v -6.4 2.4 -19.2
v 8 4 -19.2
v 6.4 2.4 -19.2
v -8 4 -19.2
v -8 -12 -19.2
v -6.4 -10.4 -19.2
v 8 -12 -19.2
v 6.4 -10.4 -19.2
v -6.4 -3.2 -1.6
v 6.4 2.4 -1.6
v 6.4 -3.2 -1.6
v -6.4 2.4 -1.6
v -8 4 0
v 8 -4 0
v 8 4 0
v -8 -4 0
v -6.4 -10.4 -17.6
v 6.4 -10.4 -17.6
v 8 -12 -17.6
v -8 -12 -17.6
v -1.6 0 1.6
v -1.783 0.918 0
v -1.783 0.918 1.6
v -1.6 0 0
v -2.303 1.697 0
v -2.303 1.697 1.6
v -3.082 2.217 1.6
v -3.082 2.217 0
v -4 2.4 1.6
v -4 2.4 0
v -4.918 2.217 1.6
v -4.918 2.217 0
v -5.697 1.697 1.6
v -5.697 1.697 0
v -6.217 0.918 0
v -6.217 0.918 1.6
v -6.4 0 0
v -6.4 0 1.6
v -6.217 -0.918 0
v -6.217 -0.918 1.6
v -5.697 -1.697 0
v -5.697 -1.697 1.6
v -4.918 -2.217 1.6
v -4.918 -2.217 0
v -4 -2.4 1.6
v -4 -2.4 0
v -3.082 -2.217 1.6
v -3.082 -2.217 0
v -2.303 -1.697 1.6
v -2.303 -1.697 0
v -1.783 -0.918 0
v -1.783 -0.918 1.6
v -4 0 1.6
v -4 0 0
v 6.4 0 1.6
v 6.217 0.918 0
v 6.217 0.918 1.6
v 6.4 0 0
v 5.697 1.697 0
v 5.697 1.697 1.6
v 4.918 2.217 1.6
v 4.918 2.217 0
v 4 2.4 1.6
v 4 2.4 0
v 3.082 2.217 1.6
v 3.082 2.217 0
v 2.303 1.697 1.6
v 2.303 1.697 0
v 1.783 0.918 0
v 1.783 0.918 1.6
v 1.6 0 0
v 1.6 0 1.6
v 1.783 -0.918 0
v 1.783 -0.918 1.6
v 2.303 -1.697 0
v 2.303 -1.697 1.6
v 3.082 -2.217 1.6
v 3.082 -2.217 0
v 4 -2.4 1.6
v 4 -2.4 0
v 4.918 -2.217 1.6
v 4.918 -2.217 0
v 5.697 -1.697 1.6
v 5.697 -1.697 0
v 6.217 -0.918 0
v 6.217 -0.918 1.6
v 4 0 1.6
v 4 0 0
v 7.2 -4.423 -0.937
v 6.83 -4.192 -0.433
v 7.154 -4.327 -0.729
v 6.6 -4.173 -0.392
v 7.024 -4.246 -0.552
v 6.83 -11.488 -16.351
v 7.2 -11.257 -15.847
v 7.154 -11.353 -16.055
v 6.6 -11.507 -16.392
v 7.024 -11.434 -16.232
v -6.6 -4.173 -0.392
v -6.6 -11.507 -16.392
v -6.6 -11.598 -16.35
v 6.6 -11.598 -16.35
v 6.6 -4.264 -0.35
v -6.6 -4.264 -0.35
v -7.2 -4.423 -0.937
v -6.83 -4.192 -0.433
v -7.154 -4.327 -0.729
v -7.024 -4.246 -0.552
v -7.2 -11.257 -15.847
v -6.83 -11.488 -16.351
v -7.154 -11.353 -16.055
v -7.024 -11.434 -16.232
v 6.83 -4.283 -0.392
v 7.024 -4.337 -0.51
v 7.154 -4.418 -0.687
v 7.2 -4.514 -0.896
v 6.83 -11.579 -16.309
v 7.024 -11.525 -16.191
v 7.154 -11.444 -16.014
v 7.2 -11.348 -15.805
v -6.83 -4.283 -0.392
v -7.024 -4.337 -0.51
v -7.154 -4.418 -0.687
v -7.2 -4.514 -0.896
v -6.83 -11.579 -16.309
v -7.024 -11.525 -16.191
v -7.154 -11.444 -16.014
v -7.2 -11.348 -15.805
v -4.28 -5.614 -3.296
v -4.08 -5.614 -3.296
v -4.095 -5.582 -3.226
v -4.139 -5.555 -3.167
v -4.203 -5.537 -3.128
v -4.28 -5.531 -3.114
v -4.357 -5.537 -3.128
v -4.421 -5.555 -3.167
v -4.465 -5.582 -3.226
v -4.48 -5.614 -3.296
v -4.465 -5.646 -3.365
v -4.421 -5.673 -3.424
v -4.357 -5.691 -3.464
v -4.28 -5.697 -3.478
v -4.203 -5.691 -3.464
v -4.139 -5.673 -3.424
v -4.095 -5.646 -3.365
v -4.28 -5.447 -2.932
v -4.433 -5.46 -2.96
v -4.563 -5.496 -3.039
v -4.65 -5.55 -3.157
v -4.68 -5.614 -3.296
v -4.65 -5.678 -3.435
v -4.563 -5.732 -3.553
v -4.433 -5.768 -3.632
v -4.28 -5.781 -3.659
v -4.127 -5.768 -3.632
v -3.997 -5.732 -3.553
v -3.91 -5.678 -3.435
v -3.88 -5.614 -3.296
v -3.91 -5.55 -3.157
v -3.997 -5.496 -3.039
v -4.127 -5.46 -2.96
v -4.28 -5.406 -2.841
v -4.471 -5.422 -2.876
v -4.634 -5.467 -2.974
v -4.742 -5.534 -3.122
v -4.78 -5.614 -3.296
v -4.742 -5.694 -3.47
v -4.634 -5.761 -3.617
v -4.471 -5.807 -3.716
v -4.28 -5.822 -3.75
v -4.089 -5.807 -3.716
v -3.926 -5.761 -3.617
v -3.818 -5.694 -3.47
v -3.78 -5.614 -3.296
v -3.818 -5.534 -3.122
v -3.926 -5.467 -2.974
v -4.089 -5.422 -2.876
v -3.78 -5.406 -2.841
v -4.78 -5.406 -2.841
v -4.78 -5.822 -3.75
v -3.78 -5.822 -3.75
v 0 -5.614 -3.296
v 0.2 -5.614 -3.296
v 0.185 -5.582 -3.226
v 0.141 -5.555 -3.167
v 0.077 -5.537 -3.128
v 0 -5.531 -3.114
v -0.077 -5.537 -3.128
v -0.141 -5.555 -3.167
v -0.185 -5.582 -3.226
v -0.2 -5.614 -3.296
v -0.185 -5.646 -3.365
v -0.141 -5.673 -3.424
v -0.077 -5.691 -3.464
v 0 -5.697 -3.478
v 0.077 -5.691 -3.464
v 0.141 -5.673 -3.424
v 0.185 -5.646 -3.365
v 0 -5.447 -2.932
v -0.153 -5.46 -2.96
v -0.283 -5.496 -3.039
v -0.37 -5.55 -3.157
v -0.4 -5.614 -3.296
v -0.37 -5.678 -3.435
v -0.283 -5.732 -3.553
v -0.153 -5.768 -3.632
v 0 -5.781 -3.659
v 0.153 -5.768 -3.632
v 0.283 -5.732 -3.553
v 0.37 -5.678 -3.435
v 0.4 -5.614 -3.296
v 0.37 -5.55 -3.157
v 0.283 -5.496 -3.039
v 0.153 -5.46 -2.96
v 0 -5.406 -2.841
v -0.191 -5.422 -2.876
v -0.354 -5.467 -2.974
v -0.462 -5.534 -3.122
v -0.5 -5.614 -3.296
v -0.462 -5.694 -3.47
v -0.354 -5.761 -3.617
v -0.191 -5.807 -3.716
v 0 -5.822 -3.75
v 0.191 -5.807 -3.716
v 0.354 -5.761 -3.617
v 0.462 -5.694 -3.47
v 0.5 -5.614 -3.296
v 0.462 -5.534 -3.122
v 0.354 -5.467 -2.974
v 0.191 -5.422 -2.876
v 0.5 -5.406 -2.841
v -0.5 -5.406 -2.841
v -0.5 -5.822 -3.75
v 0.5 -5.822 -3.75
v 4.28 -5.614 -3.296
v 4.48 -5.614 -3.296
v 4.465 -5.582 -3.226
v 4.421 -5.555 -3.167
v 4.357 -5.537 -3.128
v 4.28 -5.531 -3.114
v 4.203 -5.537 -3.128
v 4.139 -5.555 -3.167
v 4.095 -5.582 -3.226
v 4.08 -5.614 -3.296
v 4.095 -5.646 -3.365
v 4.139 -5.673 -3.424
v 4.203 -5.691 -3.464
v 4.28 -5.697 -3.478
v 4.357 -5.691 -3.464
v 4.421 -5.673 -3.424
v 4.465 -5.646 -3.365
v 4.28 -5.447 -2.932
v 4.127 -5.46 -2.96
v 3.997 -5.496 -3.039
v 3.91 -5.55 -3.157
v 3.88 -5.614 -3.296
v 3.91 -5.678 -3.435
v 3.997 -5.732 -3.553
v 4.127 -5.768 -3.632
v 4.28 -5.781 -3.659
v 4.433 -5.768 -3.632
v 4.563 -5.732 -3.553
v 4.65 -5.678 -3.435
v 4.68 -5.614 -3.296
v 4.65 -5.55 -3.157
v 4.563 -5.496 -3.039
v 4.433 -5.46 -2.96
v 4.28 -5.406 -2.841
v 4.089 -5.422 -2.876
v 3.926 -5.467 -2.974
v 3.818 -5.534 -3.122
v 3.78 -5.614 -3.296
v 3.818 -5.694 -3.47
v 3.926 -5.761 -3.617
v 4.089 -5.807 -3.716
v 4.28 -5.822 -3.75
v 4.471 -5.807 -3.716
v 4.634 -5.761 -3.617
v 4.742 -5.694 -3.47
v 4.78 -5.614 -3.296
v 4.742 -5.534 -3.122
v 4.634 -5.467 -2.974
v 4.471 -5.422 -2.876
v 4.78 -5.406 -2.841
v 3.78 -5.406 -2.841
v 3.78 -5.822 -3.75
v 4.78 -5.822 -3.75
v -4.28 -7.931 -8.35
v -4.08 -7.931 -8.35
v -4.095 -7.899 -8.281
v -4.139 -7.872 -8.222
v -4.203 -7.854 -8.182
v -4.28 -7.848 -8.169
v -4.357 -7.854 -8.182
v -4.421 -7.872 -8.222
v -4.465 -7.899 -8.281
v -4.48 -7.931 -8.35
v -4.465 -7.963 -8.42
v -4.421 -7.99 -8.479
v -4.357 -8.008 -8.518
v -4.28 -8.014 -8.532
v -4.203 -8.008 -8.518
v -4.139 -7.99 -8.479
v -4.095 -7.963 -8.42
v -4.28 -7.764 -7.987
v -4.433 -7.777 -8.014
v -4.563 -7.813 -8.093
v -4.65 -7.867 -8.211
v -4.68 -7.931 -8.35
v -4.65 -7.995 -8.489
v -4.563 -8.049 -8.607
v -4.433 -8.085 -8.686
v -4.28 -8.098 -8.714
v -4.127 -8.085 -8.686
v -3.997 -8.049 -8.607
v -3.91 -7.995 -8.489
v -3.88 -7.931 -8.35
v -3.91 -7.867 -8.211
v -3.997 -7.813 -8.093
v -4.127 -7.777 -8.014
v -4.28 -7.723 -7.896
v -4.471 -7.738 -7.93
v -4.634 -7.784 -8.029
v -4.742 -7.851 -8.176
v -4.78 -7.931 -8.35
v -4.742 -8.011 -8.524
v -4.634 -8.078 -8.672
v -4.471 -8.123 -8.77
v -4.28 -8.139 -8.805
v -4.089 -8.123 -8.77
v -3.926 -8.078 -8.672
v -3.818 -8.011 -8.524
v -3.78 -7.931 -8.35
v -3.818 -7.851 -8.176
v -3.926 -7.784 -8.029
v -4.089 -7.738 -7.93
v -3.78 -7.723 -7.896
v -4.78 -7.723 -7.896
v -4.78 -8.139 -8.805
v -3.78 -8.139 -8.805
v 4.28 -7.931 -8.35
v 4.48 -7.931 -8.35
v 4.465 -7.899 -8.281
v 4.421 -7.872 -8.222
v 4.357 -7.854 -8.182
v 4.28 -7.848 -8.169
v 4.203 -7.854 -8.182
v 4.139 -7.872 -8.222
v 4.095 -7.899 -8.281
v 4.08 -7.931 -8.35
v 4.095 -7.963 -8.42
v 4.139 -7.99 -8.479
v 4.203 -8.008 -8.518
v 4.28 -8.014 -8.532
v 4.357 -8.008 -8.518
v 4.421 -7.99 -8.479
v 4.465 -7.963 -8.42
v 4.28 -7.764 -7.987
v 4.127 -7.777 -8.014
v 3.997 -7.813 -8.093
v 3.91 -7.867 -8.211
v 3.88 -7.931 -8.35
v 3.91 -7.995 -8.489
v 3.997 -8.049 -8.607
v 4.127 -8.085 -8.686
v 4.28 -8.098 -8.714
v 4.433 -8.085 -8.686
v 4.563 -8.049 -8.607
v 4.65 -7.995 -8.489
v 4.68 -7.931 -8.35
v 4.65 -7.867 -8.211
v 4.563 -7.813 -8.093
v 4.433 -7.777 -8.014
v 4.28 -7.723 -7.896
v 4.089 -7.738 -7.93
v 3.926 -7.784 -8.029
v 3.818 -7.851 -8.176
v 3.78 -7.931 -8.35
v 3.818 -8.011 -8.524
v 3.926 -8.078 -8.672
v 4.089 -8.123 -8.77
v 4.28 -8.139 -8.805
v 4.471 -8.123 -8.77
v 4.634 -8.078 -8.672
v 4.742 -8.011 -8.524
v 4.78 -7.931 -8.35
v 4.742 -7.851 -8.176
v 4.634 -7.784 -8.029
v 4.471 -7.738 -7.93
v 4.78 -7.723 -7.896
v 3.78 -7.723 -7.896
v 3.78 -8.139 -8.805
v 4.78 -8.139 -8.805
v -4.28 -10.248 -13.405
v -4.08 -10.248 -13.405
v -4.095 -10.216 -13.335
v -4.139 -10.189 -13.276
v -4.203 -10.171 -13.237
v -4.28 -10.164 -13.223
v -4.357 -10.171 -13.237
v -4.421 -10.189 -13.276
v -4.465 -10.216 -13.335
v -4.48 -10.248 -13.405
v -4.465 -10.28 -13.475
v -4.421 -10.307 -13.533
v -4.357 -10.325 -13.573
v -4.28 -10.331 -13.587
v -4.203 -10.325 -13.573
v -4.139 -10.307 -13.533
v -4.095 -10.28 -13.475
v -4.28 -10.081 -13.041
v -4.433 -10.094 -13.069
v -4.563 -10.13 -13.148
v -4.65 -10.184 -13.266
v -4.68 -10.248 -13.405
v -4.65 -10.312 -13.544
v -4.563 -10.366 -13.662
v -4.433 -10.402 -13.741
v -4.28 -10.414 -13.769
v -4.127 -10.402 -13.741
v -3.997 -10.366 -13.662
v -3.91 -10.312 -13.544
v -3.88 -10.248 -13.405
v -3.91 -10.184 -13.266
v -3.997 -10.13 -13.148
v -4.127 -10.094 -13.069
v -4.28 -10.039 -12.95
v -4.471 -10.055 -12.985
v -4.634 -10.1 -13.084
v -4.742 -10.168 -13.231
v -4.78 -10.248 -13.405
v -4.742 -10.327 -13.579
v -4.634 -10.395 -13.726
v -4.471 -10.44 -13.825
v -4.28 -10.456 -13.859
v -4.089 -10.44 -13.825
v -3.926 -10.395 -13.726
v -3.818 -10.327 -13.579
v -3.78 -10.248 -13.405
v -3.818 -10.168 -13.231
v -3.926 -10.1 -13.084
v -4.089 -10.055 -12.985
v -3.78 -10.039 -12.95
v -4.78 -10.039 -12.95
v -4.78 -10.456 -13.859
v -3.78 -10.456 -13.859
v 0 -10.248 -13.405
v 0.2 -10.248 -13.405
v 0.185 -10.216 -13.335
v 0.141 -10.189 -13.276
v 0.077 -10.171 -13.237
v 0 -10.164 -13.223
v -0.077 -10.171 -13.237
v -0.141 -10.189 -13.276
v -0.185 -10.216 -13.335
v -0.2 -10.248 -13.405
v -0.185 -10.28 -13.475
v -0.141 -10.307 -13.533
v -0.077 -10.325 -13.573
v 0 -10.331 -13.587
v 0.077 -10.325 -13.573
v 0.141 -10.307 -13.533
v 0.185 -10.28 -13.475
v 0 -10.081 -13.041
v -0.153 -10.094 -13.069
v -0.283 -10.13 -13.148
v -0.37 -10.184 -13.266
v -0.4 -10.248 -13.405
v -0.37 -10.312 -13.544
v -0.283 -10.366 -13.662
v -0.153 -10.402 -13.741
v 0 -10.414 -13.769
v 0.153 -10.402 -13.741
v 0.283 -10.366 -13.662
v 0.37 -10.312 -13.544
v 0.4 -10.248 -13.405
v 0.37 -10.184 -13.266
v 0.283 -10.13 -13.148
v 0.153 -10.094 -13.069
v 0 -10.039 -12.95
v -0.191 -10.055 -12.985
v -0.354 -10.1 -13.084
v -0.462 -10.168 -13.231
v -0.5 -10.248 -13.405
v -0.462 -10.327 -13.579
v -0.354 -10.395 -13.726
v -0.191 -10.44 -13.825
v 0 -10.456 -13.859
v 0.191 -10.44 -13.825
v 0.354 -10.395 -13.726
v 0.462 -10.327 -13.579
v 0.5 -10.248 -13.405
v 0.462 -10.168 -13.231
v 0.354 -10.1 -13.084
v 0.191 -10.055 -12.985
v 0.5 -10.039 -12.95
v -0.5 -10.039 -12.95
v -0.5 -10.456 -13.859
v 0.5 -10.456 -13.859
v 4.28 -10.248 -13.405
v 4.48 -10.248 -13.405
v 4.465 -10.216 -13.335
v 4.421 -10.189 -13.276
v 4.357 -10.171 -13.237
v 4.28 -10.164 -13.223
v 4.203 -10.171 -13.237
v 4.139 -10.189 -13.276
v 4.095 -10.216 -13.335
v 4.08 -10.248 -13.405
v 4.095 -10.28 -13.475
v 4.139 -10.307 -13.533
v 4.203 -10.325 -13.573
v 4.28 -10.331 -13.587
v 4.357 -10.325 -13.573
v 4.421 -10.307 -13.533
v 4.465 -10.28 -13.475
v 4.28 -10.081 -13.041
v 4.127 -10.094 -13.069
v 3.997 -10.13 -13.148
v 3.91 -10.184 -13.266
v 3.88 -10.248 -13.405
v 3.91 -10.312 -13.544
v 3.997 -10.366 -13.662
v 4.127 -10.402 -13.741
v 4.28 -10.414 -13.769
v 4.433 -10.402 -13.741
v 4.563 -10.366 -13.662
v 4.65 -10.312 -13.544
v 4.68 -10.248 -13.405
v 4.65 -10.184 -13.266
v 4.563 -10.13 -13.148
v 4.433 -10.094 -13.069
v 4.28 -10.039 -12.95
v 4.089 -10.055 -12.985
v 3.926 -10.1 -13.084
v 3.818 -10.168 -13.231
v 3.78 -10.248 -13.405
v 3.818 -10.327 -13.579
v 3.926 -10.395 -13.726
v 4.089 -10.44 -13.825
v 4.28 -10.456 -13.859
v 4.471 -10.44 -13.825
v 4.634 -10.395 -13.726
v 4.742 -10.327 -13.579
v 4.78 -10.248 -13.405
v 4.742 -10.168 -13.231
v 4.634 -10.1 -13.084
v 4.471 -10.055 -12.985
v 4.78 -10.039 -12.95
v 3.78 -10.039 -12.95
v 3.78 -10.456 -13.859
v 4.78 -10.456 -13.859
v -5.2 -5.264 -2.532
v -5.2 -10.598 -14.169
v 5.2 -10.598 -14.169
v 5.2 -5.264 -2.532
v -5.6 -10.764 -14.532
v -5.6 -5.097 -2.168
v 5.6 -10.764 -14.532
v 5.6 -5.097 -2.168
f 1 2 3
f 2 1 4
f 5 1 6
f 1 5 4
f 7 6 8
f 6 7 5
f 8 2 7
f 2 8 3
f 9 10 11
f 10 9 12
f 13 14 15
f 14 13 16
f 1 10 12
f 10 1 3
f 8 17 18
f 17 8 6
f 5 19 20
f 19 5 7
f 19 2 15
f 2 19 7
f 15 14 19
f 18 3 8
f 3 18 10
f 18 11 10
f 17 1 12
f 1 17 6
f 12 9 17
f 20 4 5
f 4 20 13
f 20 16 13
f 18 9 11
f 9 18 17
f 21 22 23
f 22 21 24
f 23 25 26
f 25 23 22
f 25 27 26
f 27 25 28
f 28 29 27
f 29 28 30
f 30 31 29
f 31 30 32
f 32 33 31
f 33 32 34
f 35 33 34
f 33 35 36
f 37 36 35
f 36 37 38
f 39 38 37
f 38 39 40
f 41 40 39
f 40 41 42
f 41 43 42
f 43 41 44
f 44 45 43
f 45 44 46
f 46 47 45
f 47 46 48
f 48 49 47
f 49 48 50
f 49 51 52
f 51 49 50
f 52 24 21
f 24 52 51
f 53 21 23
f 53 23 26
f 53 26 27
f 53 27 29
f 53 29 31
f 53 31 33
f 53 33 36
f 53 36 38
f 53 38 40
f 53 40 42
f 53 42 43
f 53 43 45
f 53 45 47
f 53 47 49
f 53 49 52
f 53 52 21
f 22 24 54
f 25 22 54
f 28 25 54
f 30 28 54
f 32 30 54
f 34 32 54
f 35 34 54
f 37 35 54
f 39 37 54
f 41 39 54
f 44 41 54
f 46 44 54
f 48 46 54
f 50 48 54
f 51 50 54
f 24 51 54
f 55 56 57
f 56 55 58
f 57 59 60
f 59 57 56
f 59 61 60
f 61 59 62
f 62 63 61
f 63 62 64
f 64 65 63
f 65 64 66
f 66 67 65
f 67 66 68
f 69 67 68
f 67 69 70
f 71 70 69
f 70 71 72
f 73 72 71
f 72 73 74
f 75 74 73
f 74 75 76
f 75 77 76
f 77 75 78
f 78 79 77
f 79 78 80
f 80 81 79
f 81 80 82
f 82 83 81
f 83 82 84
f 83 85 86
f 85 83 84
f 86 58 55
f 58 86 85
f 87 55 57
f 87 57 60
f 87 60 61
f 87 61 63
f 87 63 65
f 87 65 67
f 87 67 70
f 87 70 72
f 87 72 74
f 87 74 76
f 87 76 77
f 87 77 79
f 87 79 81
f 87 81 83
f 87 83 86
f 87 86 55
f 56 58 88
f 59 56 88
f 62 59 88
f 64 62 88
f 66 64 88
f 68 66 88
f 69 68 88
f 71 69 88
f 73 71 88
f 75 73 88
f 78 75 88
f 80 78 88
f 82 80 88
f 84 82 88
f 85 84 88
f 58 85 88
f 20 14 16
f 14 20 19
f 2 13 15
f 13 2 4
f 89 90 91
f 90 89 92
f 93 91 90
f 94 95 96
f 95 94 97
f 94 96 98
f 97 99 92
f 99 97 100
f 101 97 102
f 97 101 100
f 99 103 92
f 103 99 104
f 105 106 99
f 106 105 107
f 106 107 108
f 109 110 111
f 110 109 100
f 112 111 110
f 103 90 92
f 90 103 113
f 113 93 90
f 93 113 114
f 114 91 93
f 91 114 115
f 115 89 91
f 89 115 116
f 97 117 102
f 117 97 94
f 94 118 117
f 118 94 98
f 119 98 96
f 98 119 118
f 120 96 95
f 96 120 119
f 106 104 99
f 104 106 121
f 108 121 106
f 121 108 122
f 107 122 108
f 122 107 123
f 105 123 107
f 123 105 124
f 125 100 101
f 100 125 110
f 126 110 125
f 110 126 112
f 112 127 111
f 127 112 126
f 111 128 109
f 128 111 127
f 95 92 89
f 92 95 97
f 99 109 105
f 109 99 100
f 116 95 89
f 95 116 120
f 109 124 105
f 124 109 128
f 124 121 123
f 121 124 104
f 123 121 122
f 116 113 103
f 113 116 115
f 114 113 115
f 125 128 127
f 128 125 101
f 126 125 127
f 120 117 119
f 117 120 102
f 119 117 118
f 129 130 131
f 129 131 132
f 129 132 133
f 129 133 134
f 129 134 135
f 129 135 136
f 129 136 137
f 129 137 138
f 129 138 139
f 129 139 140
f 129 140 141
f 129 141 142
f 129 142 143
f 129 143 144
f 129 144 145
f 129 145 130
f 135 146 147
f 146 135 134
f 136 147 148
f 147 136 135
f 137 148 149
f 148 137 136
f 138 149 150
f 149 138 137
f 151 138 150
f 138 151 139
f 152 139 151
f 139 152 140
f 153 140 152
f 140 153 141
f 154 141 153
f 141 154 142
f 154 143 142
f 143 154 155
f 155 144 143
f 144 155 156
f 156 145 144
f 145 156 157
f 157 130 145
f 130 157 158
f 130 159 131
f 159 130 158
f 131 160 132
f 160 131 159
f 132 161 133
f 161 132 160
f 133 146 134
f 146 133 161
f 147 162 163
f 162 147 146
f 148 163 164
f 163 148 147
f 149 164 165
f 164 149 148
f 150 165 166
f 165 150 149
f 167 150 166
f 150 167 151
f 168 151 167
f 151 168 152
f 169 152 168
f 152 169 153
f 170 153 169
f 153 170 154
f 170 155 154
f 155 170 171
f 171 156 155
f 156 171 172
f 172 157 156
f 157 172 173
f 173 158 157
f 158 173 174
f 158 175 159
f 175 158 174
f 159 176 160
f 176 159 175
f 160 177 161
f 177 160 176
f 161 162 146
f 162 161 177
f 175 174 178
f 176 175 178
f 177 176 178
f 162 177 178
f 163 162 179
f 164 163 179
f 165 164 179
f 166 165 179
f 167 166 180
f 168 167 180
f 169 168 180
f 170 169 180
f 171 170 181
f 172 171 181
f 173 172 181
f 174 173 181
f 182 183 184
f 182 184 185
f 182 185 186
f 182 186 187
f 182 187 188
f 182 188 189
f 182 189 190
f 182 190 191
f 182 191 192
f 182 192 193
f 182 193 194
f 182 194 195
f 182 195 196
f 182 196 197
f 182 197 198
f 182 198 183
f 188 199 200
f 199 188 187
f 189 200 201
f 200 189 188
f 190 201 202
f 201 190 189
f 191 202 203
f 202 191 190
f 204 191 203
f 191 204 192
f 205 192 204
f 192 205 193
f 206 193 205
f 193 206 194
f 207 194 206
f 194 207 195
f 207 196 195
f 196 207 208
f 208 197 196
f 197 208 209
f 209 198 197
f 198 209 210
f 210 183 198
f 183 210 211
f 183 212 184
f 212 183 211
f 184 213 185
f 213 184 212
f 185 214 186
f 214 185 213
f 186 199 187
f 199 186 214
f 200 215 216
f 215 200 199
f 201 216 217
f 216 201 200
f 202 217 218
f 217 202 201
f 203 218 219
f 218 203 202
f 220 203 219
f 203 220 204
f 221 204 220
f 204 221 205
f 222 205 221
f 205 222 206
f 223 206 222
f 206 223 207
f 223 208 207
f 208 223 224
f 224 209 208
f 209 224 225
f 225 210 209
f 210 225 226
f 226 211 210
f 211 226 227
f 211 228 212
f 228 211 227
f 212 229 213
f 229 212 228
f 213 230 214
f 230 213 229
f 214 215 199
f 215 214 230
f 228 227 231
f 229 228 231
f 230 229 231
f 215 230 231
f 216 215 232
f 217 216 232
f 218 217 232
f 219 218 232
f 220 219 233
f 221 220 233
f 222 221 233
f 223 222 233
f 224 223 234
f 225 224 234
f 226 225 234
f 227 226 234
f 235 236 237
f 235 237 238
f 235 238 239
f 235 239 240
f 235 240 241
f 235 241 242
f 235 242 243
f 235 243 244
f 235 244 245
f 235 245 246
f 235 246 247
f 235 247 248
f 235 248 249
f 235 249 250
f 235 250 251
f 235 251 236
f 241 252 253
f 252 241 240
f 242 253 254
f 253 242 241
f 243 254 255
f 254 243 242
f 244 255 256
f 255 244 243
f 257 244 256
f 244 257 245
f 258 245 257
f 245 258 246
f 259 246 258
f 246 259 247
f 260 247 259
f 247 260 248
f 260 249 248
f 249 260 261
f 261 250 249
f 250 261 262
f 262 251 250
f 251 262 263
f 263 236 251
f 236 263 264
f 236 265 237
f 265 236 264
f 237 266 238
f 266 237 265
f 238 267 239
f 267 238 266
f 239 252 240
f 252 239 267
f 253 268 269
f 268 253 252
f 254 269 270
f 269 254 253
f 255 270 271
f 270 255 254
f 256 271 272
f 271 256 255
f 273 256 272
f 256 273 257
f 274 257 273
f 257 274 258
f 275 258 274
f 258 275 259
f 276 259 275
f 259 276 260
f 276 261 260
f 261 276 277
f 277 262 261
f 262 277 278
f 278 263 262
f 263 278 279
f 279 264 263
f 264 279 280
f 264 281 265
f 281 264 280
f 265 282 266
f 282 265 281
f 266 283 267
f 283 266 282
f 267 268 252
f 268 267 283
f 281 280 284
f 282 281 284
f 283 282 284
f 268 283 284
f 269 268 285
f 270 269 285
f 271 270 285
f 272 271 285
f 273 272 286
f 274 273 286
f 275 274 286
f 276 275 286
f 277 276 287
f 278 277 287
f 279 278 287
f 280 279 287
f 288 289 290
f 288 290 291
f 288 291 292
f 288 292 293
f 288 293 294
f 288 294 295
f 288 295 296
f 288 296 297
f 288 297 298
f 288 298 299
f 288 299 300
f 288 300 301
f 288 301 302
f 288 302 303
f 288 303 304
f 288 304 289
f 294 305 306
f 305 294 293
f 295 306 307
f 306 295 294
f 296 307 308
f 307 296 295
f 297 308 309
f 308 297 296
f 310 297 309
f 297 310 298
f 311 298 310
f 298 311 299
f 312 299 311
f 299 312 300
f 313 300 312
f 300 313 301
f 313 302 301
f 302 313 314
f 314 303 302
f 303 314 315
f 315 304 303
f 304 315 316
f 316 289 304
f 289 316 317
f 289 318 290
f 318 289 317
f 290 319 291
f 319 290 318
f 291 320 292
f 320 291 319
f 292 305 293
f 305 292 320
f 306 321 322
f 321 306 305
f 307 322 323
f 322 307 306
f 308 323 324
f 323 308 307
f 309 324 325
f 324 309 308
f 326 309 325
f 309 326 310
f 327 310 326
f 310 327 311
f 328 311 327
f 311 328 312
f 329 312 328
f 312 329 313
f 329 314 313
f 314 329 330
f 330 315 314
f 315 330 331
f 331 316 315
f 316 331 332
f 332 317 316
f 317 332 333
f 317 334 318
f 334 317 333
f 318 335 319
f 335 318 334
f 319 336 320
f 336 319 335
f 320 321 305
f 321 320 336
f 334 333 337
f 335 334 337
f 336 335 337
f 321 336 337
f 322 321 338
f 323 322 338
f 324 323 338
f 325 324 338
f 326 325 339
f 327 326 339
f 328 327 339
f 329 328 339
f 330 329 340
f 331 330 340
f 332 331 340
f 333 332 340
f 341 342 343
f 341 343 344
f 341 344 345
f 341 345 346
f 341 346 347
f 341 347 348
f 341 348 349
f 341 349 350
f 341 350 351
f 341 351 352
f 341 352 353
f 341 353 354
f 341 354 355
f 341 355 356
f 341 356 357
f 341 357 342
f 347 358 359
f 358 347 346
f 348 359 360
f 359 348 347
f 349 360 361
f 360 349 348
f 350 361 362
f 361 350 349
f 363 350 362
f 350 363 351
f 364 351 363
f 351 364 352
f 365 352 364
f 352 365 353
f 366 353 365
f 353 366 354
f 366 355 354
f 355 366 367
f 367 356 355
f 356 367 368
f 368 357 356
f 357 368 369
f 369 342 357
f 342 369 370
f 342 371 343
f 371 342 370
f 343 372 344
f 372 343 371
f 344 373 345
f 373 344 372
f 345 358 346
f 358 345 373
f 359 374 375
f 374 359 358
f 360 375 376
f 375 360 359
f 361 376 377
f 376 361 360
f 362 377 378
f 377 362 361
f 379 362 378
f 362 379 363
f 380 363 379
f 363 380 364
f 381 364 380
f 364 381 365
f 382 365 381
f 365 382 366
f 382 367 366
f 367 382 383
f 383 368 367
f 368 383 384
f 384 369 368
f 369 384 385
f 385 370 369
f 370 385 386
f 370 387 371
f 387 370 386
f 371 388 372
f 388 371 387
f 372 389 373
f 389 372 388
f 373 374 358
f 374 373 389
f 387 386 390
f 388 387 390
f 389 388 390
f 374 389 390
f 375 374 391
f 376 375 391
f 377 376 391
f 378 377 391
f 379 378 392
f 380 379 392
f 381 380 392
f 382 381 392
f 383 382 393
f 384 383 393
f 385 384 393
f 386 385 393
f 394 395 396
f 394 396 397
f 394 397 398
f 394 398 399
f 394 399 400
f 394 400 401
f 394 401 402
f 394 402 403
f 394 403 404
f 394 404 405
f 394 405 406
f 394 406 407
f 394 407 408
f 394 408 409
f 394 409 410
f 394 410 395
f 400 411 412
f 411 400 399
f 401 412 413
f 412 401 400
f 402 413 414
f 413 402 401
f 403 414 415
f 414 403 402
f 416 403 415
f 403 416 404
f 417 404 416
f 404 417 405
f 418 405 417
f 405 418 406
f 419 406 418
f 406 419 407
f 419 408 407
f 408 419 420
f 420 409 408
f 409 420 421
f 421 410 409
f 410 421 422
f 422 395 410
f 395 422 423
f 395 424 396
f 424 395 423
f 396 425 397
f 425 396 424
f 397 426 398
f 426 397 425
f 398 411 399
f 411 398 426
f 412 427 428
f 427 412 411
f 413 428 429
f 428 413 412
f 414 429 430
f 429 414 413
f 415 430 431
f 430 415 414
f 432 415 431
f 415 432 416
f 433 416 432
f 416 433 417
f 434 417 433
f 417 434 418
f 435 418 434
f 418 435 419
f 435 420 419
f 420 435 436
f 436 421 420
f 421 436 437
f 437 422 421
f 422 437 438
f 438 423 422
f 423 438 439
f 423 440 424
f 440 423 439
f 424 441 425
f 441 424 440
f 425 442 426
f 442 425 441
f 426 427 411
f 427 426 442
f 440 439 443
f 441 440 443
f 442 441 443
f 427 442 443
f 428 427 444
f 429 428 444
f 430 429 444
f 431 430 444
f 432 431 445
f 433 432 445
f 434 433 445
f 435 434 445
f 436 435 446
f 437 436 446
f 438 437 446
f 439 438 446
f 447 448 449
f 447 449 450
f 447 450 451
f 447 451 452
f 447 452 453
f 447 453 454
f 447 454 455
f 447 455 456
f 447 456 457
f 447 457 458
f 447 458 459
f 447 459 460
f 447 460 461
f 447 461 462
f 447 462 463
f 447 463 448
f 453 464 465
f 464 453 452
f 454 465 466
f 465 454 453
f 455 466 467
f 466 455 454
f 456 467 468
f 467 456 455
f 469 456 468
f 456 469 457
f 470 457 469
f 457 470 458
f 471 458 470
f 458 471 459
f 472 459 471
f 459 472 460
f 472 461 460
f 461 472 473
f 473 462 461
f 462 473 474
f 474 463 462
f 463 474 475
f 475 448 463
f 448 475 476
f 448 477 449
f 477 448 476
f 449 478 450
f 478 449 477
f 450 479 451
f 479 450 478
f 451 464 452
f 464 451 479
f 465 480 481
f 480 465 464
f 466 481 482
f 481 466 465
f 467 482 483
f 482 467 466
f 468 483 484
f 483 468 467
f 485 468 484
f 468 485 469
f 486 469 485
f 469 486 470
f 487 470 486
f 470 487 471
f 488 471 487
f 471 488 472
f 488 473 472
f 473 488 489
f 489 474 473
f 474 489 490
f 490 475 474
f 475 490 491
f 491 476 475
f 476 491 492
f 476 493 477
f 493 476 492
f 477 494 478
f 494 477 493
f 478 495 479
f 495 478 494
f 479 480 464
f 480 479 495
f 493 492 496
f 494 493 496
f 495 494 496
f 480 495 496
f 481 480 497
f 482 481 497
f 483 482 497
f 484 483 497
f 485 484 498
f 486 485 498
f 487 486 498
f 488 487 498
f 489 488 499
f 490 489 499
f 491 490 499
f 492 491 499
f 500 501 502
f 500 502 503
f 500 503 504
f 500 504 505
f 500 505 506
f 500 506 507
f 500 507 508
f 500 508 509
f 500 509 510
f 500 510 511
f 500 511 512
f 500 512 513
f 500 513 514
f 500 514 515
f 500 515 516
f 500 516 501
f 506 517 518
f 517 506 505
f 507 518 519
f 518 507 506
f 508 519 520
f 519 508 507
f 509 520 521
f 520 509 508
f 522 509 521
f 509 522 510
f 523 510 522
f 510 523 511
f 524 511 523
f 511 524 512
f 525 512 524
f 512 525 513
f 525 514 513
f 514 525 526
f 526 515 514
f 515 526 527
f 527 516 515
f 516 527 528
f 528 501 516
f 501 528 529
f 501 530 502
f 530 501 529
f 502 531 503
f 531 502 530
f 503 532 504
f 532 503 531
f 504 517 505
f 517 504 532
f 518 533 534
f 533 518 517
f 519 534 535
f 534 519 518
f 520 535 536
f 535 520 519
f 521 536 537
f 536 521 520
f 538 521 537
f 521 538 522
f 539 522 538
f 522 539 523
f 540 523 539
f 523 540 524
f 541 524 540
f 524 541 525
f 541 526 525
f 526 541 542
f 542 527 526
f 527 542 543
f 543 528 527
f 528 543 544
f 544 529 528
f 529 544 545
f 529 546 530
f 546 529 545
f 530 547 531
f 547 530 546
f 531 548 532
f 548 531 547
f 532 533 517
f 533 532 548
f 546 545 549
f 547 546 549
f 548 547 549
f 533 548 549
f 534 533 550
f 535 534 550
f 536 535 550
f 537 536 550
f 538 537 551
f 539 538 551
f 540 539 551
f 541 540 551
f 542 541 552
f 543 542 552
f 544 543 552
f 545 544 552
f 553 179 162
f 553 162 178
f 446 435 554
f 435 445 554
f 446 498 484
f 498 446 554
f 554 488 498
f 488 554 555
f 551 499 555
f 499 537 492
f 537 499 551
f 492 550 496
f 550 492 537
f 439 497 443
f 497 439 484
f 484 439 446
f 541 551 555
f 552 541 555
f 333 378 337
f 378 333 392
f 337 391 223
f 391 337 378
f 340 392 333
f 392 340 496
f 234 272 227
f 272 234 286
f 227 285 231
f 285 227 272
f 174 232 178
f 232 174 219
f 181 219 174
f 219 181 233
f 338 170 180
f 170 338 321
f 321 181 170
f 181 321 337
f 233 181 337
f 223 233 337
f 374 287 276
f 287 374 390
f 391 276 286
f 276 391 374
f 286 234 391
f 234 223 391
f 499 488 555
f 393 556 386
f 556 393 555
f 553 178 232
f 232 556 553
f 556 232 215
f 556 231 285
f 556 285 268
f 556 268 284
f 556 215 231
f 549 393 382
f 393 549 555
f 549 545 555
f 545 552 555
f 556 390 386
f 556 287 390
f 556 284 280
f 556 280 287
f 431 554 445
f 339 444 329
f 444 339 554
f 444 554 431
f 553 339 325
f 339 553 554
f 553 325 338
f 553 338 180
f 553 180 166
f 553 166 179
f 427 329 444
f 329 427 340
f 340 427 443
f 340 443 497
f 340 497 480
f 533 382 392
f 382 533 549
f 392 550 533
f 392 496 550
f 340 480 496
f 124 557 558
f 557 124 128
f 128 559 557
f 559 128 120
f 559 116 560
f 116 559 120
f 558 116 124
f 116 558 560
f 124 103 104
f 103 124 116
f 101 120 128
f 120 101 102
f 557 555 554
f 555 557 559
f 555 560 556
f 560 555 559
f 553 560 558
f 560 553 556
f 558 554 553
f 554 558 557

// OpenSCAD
use <../lib.scad>
use <3678a.scad>
use <4159998c.scad>
function ldraw_lib__3678ad01() = [
// 0 Slope Brick 65  2 x  2 x  2 without Centre Tube with Silver Frame and Rivets on Black Background Sticker
// 0 Name: 3678ad01.dat
// 0 Author: Gerald Lasser [GeraldLasser]
// 0 !LDRAW_ORG Shortcut UPDATE 2026-08
// 0 !LICENSE Licensed under CC BY 4.0 : see CAreadme.txt
// 
// 0 BFC CERTIFY CCW
  [0,"BFC","CERTIFY"],
  [0,"BFC","CCW"],
// 
// 0 !CATEGORY Sticker Shortcut
// 0 !KEYWORDS Set 10205, Set 3740, Set 3741
// 
// 0 !HISTORY 2015-10-11 [PTadmin] Official Update 2015-01
// 0 !HISTORY 2024-05-27 [OrionP] Change category to Sticker Shortcut
// 0 !HISTORY 2024-05-28 [OrionP] Official Update 2024-04
// 0 !HISTORY 2026-04-28 [Sirio] Changed description: moved "Sticker" to end
// 0 !HISTORY 2026-08-31 [OrionP] Official Update 2026-08
// 
// 1 16 0 0 0 1 0 0 0 1 0 0 0 1 3678a.dat
  [1,16,0,0,0,1,0,0,0,1,0,0,0,1, ldraw_lib__3678a()],
// 1 16 0 20.98 -19.6 1 0 0 0 0.4167 -0.9091 0 0.9091 0.4167 4159998c.dat
  [1,16,0,20.98,-19.6,1,0,0,0,0.4167,-0.9091,0,0.9091,0.4167, ldraw_lib__4159998c()],
];
module ldraw_lib__3678ad01(step=0, col=false, unit=2/5, alt=false, line=0.2, solid=!$preview)
    makepoly(ldraw_lib__3678ad01(), step=step, col=col, unit=unit, alt=alt, line=line, solid=solid);
ldraw_lib__3678ad01(line=0.2);
